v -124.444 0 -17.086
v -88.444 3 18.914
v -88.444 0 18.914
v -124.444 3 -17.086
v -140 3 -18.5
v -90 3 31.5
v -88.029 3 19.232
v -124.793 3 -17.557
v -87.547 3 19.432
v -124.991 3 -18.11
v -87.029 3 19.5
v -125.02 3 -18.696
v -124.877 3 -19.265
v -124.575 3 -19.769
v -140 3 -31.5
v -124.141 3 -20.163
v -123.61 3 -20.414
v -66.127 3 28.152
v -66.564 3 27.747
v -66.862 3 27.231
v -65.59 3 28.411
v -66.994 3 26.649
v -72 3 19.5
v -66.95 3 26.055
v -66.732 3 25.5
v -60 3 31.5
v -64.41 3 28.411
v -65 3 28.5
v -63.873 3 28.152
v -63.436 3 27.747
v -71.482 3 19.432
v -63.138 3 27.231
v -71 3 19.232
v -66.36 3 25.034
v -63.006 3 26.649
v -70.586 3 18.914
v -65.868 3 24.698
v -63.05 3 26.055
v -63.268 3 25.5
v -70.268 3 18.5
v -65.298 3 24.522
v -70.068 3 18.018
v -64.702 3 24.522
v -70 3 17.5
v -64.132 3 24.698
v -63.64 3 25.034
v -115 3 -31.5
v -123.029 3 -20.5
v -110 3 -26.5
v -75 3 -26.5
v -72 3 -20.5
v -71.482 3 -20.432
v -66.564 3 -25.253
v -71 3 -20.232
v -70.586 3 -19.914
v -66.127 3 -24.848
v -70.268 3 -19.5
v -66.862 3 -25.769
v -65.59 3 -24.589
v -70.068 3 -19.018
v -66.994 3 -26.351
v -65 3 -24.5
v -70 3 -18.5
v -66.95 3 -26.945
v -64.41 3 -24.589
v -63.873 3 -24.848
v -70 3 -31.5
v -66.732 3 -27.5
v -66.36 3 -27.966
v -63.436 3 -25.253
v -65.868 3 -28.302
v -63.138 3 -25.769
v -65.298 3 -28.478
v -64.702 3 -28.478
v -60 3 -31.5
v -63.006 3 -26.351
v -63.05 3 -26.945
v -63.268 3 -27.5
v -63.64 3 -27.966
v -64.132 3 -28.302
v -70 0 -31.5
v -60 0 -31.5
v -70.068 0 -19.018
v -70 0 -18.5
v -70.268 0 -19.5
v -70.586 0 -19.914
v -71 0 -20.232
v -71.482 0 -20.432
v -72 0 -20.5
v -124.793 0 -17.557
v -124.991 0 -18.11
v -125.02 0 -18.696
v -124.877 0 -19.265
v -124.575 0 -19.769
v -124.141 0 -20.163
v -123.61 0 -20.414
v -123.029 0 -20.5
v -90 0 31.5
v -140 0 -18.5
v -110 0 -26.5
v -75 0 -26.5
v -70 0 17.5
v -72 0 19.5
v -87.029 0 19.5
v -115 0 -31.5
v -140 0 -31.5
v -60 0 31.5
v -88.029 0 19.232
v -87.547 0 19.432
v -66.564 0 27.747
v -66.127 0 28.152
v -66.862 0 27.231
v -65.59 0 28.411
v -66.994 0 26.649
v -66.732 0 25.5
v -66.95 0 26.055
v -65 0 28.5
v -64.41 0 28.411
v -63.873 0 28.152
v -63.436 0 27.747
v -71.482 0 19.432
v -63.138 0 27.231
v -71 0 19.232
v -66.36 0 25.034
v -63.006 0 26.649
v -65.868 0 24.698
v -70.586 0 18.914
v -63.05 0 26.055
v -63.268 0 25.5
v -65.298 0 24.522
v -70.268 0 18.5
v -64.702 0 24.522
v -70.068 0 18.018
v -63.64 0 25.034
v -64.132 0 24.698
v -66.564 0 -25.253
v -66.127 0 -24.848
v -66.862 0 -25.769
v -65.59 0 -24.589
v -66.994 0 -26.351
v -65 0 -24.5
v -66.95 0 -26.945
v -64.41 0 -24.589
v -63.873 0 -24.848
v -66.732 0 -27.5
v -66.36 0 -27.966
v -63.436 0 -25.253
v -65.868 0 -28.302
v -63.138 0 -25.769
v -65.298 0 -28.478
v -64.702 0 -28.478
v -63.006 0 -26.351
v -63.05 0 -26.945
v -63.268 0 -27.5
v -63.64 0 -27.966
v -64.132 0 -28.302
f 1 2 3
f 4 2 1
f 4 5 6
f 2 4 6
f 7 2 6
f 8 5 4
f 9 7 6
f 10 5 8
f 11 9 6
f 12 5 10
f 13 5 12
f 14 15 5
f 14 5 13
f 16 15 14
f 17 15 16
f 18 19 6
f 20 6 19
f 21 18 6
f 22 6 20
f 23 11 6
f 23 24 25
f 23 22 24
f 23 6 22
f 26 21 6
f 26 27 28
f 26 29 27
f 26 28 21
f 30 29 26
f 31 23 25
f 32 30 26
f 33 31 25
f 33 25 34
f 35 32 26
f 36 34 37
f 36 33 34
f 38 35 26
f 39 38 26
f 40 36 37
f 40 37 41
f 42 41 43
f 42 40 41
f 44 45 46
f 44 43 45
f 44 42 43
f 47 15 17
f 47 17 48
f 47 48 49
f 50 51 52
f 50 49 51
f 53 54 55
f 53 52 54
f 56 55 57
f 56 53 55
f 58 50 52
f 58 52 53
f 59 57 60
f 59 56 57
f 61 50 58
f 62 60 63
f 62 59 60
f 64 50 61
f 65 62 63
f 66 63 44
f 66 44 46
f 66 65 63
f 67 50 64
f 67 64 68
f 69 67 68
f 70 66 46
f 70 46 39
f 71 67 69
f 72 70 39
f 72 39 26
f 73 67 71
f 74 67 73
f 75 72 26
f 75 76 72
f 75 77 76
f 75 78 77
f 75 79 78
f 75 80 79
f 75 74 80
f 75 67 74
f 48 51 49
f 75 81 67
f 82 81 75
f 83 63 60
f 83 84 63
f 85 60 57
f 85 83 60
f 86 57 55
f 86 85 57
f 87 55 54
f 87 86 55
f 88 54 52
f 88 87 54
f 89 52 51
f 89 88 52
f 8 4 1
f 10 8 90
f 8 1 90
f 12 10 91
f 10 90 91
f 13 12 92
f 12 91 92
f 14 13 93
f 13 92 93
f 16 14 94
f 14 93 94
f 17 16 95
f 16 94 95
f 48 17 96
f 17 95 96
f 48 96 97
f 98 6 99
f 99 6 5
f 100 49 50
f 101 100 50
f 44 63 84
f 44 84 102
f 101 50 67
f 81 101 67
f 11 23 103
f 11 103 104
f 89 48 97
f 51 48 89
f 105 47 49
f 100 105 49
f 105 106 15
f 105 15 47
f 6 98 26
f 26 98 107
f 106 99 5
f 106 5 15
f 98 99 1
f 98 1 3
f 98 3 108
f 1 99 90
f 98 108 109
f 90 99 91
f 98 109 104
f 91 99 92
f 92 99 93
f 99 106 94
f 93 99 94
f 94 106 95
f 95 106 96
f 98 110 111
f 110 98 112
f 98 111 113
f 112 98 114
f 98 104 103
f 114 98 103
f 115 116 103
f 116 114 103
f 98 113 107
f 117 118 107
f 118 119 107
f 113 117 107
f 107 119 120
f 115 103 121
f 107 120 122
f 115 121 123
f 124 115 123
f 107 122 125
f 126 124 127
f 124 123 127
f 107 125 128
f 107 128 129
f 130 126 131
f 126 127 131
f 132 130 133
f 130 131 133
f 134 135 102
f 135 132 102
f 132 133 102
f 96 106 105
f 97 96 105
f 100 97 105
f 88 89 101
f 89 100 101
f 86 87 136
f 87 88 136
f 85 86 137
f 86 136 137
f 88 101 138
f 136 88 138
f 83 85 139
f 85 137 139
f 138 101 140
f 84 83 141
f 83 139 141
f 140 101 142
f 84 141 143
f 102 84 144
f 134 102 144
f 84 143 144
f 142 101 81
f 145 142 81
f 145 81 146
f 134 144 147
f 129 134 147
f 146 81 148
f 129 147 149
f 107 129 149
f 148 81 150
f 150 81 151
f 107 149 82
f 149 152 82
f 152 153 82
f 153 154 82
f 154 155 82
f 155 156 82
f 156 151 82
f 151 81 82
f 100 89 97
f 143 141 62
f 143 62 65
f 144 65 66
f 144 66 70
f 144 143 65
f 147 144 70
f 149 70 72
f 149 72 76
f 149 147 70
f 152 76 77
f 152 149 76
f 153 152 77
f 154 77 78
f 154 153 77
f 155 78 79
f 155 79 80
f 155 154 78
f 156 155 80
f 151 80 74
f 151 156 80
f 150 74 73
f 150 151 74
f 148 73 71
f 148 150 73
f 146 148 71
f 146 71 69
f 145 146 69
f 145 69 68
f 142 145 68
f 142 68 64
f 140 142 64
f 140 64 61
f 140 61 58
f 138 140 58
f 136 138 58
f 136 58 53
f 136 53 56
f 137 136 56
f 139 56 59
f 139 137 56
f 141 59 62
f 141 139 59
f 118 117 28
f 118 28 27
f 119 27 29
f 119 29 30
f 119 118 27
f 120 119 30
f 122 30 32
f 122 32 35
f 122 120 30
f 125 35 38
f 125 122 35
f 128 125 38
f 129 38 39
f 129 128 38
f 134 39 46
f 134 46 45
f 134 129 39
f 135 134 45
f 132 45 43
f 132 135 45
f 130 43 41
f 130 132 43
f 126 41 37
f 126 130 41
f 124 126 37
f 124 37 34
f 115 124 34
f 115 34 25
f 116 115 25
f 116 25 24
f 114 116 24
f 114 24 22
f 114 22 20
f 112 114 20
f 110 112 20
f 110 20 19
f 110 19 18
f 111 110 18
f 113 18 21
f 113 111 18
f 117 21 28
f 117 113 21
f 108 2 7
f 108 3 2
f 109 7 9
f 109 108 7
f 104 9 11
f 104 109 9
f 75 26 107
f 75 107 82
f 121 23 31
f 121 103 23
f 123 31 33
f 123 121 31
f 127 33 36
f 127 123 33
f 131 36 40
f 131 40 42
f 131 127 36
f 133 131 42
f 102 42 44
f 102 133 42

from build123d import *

# Parameters (mm, degrees)
SKETCH_1_W          = 280
SKETCH_1_H          = 63
SKETCH_1_R          = 2
EXTRUDE_1_DEPTH     = 3
CUT_EXTRUDE_1_DEPTH = 3
SKETCH_3_W          = 200
SKETCH_3_H          = 63
CUT_EXTRUDE_2_DEPTH = 10
CUT_EXTRUDE_3_DEPTH = 10
CUT_EXTRUDE_4_DEPTH = 10
FILLET_1_R          = 2


with BuildPart() as part:
    # 草图1 → 凸台-拉伸1 (new body)
    with BuildSketch(Plane(origin=(0, 0, 0), x_dir=(1, 0, 0), z_dir=(0, 1, 0))):
        Rectangle(SKETCH_1_W, SKETCH_1_H)
        with Locations(Location((-65, 26.5, 0), (0, 0, 270))):
            Circle(SKETCH_1_R, mode=Mode.SUBTRACT)
        with Locations(Location((-65, -26.5, 0), (0, 0, 270))):
            Circle(SKETCH_1_R, mode=Mode.SUBTRACT)
        with Locations(Location((65, -26.5, 0), (0, 0, 90))):
            Circle(SKETCH_1_R, mode=Mode.SUBTRACT)
        with Locations(Location((65, 26.5, 0), (0, 0, 90))):
            Circle(SKETCH_1_R, mode=Mode.SUBTRACT)
    extrude(amount=EXTRUDE_1_DEPTH)

    # 草图2 → 切除-拉伸1 (cut)
    with BuildSketch(Plane(origin=(0, 3, 0), x_dir=(1, 0, 0), z_dir=(0, 1, 0))):
        Polygon((-140, 18.5), (-140, -31.5), (-90, -31.5), align=None)
        Polygon((90, -31.5), (140, 18.5), (140, -31.5), align=None)
    extrude(amount=-CUT_EXTRUDE_1_DEPTH, mode=Mode.SUBTRACT)

    # 草图3 → 切除-拉伸2 (cut)
    with BuildSketch(Plane(origin=(0, 3, 0), x_dir=(1, 0, 0), z_dir=(0, 1, 0))):
        with Locations((40, 0)):
            Rectangle(SKETCH_3_W, SKETCH_3_H)
    extrude(amount=-CUT_EXTRUDE_2_DEPTH, mode=Mode.SUBTRACT)

    # 草图4 → 切除-拉伸3 (cut)
    with BuildSketch(Plane(origin=(0, 3, 0), x_dir=(1, 0, 0), z_dir=(0, 1, 0))):
        Polygon((-115, 31.5), (-110, 26.5), (-75, 26.5), (-70, 31.5), align=None)
    extrude(amount=-CUT_EXTRUDE_3_DEPTH, mode=Mode.SUBTRACT)

    # 草图5 → 切除-拉伸4 (cut)
    with BuildSketch(Plane(origin=(0, 3, 0), x_dir=(1, 0, 0), z_dir=(0, 1, 0))):
        Polygon((-127.857864376, 20.5), (-70, 20.5), (-70, -19.5), (-87.857864376, -19.5), align=None)
    extrude(amount=-CUT_EXTRUDE_4_DEPTH, mode=Mode.SUBTRACT)

    # 圆角1
    fillet_1_edges = [part.edges().sort_by_distance(p)[0] for p in [
        (-70, 1.5, -20.5),
        (-70, 1.5, 19.5),
        (-87.857864376, 1.5, 19.5),
        (-127.857864376, 1.5, -20.5),
    ]]
    fillet(fillet_1_edges, radius=FILLET_1_R)


solid = part.part
